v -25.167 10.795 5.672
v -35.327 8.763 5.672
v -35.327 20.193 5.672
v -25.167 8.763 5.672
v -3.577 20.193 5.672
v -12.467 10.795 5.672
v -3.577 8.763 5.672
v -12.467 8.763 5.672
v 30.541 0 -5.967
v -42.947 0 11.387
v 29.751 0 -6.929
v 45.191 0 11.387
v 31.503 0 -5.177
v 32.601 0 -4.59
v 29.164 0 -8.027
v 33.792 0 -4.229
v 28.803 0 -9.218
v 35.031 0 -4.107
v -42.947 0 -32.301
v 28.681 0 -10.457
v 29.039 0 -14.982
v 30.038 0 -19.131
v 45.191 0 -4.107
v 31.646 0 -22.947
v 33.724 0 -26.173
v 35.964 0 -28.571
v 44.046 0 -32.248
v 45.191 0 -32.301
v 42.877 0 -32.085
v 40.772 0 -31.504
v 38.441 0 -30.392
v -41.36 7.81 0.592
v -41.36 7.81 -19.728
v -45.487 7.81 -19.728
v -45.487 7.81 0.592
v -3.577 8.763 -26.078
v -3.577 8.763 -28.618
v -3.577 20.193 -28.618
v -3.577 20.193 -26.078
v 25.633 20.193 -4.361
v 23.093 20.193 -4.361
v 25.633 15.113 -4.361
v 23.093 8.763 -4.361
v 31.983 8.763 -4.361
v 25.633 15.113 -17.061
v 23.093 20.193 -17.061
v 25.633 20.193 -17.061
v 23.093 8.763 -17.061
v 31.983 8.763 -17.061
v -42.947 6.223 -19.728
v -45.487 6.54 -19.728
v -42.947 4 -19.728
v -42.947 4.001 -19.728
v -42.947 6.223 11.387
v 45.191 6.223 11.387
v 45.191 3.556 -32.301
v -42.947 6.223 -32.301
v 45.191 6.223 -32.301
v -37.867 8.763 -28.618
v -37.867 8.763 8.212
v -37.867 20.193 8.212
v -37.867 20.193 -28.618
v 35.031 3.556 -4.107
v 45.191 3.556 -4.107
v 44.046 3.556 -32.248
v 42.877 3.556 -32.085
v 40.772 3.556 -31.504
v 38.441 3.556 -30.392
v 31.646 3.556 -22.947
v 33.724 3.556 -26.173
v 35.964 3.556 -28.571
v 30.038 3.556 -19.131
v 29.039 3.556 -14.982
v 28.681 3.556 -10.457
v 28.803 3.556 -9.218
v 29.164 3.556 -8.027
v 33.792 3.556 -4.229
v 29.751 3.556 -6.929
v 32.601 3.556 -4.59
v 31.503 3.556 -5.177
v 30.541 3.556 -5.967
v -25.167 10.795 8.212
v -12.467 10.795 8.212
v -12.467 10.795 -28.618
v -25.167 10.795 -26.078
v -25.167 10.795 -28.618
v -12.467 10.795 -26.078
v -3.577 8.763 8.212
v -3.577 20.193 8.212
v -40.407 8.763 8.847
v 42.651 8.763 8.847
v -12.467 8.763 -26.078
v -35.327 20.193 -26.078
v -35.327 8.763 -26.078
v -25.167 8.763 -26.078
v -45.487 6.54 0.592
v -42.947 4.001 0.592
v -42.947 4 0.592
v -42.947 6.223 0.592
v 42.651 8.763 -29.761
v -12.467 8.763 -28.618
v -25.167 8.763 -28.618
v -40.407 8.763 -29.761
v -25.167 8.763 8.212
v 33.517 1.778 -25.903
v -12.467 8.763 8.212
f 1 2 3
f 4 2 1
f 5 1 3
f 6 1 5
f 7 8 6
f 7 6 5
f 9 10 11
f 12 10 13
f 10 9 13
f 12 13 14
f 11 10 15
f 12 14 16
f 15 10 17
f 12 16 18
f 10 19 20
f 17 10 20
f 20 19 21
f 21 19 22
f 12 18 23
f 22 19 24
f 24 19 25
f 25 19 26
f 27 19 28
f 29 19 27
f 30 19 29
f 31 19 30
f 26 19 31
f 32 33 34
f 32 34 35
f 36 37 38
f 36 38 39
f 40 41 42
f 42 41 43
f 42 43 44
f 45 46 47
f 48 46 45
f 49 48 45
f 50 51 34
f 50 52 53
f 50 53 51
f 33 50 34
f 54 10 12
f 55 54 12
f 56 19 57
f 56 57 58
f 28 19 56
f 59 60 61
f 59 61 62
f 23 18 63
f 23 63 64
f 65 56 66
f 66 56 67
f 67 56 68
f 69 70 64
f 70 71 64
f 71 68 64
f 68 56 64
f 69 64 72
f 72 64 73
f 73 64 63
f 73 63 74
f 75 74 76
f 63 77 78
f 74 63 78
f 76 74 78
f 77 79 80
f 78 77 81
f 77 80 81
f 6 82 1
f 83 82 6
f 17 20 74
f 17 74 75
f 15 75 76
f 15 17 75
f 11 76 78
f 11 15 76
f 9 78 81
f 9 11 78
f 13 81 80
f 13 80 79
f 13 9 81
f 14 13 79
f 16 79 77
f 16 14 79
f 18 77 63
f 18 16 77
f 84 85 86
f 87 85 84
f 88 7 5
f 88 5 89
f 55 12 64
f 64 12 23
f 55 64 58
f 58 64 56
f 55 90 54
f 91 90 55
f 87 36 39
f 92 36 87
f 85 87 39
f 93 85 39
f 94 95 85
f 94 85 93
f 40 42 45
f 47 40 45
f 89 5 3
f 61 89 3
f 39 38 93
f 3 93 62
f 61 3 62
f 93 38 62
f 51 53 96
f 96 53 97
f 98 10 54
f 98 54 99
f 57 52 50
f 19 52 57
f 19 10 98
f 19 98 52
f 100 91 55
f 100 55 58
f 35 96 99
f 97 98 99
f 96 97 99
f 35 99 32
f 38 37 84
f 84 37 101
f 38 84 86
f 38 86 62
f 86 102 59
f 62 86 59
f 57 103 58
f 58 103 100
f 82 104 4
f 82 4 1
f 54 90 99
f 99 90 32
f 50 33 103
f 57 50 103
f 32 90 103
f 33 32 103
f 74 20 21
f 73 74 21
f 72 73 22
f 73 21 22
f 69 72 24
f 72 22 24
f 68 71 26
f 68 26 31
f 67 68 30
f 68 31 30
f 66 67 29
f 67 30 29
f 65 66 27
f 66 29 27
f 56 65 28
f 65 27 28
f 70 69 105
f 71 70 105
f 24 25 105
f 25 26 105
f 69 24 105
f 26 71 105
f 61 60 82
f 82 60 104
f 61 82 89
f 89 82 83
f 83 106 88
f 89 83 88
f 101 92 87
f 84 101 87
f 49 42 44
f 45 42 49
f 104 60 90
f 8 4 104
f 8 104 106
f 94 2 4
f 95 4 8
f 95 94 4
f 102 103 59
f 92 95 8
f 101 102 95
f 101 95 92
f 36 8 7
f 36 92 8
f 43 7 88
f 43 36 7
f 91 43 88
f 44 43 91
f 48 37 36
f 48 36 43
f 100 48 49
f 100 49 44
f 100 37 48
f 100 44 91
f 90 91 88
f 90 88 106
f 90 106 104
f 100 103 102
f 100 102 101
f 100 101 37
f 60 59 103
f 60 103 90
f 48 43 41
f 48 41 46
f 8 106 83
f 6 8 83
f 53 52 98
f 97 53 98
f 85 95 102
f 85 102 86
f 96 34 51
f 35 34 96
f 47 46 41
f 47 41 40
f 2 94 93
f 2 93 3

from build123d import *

# Parameters (mm, degrees)
SKETCH1_W           = 88.138
SKETCH1_H           = 43.688
BOSS_EXTRUDE1_DEPTH = 8.763
CHAMFER1_SIZE       = 2.54
SKETCH2_W           = 2.54
SKETCH2_H           = 12.7
BOSS_EXTRUDE2_DEPTH = 11.43
SKETCH3_W           = 20.32
SKETCH3_H           = 3.81
BOSS_EXTRUDE3_DEPTH = 7.62
CHAMFER2_SIZE       = 2.54
SKETCH4_W           = 12.7
SKETCH4_H           = 2.032
CUT_EXTRUDE1_DEPTH  = 50.8
CUT_EXTRUDE2_DEPTH  = 3.556
CHAMFER3_SIZE       = 6.35


with BuildPart() as part:
    # Sketch1 → Boss-Extrude1 (new body)
    with BuildSketch(Plane(origin=(0, 0, 0), x_dir=(1, 0, 0), z_dir=(0, 1, 0))):
        with Locations((1.121860858, 10.456938882)):
            Rectangle(SKETCH1_W, SKETCH1_H)
    extrude(amount=BOSS_EXTRUDE1_DEPTH)

    # Chamfer1
    chamfer1_edges = [part.edges().sort_by_distance(p)[0] for p in [
        (45.190860858, 8.763, -10.456938882),
        (1.121860858, 8.763, -32.300938882),
        (-42.947139142, 8.763, -10.456938882),
        (1.121860858, 8.763, 11.387061118),
    ]]
    chamfer(chamfer1_edges, length=CHAMFER1_SIZE)

    # Sketch2 → Boss-Extrude2 (add)
    with BuildSketch(Plane(origin=(0, 8.763, 0), x_dir=(1, 0, 0), z_dir=(0, 1, 0))):
        Polygon((-37.867139142, 28.617938882), (-35.327139142, 28.617938882), (-3.577139142, 28.617938882), (-3.577139142, 26.077938882), (-35.327139142, 26.077938882), (-35.327139142, -5.672061118), (-3.577139142, -5.672061118), (-3.577139142, -8.212061118), (-35.327139142, -8.212061118), (-37.867139142, -8.212061118), align=None)
        with Locations((24.362860858, 10.710938882)):
            Rectangle(SKETCH2_W, SKETCH2_H)
    extrude(amount=BOSS_EXTRUDE2_DEPTH)

    # Sketch3 → Boss-Extrude3 (add)
    with BuildSketch(Plane.ZY.offset(37.867139142)):
        with Locations((-9.567938882, 5.9055)):
            Rectangle(SKETCH3_W, SKETCH3_H)
    extrude(amount=BOSS_EXTRUDE3_DEPTH)

    # Chamfer2
    chamfer2_edges = [part.edges().sort_by_distance(p)[0] for p in [
        (-45.487139142, 4.0005, -9.567938882),
    ]]
    chamfer(chamfer2_edges, length=CHAMFER2_SIZE - 0.0001)  # a hair under: the kernel refuses the full size

    # Sketch4 → Cut-Extrude1 (cut)
    with BuildSketch(Plane.XY.offset(8.212061118)):
        with Locations((-18.817139142, 9.779)):
            Rectangle(SKETCH4_W, SKETCH4_H)
    extrude(amount=-CUT_EXTRUDE1_DEPTH, mode=Mode.SUBTRACT)

    # Sketch5 → Cut-Extrude2 (cut)
    with BuildSketch(Plane.XZ):
        with BuildLine():
            Line((35.030860858, -4.106938882), (45.190860858, -4.106938882))
            Line((45.190860858, -4.106938882), (45.190860858, -16.806938882))
            Line((45.190860858, -16.806938882), (45.190860858, -32.300938882))
            add(Edge.make_bspline(
                [(28.680860858, -10.456938882), (28.680860858, -32.300938882), (45.190860858, -32.300938882)],
                knots=[4.71238898, 4.71238898, 4.71238898, 6.283185307, 6.283185307, 6.283185307], degree=2, weights=[1, 0.707106781, 1]))
            ThreePointArc((28.680860858, -10.456938882), (30.540732798, -5.966810821), (35.030860858, -4.106938882))
        make_face()
    extrude(amount=-CUT_EXTRUDE2_DEPTH, mode=Mode.SUBTRACT)

    # Chamfer3
    chamfer3_edges = [part.edges().sort_by_distance(p)[0] for p in [
        (25.632860858, 8.763, -10.710938882),
    ]]
    chamfer(chamfer3_edges, length=CHAMFER3_SIZE)


solid = part.part
